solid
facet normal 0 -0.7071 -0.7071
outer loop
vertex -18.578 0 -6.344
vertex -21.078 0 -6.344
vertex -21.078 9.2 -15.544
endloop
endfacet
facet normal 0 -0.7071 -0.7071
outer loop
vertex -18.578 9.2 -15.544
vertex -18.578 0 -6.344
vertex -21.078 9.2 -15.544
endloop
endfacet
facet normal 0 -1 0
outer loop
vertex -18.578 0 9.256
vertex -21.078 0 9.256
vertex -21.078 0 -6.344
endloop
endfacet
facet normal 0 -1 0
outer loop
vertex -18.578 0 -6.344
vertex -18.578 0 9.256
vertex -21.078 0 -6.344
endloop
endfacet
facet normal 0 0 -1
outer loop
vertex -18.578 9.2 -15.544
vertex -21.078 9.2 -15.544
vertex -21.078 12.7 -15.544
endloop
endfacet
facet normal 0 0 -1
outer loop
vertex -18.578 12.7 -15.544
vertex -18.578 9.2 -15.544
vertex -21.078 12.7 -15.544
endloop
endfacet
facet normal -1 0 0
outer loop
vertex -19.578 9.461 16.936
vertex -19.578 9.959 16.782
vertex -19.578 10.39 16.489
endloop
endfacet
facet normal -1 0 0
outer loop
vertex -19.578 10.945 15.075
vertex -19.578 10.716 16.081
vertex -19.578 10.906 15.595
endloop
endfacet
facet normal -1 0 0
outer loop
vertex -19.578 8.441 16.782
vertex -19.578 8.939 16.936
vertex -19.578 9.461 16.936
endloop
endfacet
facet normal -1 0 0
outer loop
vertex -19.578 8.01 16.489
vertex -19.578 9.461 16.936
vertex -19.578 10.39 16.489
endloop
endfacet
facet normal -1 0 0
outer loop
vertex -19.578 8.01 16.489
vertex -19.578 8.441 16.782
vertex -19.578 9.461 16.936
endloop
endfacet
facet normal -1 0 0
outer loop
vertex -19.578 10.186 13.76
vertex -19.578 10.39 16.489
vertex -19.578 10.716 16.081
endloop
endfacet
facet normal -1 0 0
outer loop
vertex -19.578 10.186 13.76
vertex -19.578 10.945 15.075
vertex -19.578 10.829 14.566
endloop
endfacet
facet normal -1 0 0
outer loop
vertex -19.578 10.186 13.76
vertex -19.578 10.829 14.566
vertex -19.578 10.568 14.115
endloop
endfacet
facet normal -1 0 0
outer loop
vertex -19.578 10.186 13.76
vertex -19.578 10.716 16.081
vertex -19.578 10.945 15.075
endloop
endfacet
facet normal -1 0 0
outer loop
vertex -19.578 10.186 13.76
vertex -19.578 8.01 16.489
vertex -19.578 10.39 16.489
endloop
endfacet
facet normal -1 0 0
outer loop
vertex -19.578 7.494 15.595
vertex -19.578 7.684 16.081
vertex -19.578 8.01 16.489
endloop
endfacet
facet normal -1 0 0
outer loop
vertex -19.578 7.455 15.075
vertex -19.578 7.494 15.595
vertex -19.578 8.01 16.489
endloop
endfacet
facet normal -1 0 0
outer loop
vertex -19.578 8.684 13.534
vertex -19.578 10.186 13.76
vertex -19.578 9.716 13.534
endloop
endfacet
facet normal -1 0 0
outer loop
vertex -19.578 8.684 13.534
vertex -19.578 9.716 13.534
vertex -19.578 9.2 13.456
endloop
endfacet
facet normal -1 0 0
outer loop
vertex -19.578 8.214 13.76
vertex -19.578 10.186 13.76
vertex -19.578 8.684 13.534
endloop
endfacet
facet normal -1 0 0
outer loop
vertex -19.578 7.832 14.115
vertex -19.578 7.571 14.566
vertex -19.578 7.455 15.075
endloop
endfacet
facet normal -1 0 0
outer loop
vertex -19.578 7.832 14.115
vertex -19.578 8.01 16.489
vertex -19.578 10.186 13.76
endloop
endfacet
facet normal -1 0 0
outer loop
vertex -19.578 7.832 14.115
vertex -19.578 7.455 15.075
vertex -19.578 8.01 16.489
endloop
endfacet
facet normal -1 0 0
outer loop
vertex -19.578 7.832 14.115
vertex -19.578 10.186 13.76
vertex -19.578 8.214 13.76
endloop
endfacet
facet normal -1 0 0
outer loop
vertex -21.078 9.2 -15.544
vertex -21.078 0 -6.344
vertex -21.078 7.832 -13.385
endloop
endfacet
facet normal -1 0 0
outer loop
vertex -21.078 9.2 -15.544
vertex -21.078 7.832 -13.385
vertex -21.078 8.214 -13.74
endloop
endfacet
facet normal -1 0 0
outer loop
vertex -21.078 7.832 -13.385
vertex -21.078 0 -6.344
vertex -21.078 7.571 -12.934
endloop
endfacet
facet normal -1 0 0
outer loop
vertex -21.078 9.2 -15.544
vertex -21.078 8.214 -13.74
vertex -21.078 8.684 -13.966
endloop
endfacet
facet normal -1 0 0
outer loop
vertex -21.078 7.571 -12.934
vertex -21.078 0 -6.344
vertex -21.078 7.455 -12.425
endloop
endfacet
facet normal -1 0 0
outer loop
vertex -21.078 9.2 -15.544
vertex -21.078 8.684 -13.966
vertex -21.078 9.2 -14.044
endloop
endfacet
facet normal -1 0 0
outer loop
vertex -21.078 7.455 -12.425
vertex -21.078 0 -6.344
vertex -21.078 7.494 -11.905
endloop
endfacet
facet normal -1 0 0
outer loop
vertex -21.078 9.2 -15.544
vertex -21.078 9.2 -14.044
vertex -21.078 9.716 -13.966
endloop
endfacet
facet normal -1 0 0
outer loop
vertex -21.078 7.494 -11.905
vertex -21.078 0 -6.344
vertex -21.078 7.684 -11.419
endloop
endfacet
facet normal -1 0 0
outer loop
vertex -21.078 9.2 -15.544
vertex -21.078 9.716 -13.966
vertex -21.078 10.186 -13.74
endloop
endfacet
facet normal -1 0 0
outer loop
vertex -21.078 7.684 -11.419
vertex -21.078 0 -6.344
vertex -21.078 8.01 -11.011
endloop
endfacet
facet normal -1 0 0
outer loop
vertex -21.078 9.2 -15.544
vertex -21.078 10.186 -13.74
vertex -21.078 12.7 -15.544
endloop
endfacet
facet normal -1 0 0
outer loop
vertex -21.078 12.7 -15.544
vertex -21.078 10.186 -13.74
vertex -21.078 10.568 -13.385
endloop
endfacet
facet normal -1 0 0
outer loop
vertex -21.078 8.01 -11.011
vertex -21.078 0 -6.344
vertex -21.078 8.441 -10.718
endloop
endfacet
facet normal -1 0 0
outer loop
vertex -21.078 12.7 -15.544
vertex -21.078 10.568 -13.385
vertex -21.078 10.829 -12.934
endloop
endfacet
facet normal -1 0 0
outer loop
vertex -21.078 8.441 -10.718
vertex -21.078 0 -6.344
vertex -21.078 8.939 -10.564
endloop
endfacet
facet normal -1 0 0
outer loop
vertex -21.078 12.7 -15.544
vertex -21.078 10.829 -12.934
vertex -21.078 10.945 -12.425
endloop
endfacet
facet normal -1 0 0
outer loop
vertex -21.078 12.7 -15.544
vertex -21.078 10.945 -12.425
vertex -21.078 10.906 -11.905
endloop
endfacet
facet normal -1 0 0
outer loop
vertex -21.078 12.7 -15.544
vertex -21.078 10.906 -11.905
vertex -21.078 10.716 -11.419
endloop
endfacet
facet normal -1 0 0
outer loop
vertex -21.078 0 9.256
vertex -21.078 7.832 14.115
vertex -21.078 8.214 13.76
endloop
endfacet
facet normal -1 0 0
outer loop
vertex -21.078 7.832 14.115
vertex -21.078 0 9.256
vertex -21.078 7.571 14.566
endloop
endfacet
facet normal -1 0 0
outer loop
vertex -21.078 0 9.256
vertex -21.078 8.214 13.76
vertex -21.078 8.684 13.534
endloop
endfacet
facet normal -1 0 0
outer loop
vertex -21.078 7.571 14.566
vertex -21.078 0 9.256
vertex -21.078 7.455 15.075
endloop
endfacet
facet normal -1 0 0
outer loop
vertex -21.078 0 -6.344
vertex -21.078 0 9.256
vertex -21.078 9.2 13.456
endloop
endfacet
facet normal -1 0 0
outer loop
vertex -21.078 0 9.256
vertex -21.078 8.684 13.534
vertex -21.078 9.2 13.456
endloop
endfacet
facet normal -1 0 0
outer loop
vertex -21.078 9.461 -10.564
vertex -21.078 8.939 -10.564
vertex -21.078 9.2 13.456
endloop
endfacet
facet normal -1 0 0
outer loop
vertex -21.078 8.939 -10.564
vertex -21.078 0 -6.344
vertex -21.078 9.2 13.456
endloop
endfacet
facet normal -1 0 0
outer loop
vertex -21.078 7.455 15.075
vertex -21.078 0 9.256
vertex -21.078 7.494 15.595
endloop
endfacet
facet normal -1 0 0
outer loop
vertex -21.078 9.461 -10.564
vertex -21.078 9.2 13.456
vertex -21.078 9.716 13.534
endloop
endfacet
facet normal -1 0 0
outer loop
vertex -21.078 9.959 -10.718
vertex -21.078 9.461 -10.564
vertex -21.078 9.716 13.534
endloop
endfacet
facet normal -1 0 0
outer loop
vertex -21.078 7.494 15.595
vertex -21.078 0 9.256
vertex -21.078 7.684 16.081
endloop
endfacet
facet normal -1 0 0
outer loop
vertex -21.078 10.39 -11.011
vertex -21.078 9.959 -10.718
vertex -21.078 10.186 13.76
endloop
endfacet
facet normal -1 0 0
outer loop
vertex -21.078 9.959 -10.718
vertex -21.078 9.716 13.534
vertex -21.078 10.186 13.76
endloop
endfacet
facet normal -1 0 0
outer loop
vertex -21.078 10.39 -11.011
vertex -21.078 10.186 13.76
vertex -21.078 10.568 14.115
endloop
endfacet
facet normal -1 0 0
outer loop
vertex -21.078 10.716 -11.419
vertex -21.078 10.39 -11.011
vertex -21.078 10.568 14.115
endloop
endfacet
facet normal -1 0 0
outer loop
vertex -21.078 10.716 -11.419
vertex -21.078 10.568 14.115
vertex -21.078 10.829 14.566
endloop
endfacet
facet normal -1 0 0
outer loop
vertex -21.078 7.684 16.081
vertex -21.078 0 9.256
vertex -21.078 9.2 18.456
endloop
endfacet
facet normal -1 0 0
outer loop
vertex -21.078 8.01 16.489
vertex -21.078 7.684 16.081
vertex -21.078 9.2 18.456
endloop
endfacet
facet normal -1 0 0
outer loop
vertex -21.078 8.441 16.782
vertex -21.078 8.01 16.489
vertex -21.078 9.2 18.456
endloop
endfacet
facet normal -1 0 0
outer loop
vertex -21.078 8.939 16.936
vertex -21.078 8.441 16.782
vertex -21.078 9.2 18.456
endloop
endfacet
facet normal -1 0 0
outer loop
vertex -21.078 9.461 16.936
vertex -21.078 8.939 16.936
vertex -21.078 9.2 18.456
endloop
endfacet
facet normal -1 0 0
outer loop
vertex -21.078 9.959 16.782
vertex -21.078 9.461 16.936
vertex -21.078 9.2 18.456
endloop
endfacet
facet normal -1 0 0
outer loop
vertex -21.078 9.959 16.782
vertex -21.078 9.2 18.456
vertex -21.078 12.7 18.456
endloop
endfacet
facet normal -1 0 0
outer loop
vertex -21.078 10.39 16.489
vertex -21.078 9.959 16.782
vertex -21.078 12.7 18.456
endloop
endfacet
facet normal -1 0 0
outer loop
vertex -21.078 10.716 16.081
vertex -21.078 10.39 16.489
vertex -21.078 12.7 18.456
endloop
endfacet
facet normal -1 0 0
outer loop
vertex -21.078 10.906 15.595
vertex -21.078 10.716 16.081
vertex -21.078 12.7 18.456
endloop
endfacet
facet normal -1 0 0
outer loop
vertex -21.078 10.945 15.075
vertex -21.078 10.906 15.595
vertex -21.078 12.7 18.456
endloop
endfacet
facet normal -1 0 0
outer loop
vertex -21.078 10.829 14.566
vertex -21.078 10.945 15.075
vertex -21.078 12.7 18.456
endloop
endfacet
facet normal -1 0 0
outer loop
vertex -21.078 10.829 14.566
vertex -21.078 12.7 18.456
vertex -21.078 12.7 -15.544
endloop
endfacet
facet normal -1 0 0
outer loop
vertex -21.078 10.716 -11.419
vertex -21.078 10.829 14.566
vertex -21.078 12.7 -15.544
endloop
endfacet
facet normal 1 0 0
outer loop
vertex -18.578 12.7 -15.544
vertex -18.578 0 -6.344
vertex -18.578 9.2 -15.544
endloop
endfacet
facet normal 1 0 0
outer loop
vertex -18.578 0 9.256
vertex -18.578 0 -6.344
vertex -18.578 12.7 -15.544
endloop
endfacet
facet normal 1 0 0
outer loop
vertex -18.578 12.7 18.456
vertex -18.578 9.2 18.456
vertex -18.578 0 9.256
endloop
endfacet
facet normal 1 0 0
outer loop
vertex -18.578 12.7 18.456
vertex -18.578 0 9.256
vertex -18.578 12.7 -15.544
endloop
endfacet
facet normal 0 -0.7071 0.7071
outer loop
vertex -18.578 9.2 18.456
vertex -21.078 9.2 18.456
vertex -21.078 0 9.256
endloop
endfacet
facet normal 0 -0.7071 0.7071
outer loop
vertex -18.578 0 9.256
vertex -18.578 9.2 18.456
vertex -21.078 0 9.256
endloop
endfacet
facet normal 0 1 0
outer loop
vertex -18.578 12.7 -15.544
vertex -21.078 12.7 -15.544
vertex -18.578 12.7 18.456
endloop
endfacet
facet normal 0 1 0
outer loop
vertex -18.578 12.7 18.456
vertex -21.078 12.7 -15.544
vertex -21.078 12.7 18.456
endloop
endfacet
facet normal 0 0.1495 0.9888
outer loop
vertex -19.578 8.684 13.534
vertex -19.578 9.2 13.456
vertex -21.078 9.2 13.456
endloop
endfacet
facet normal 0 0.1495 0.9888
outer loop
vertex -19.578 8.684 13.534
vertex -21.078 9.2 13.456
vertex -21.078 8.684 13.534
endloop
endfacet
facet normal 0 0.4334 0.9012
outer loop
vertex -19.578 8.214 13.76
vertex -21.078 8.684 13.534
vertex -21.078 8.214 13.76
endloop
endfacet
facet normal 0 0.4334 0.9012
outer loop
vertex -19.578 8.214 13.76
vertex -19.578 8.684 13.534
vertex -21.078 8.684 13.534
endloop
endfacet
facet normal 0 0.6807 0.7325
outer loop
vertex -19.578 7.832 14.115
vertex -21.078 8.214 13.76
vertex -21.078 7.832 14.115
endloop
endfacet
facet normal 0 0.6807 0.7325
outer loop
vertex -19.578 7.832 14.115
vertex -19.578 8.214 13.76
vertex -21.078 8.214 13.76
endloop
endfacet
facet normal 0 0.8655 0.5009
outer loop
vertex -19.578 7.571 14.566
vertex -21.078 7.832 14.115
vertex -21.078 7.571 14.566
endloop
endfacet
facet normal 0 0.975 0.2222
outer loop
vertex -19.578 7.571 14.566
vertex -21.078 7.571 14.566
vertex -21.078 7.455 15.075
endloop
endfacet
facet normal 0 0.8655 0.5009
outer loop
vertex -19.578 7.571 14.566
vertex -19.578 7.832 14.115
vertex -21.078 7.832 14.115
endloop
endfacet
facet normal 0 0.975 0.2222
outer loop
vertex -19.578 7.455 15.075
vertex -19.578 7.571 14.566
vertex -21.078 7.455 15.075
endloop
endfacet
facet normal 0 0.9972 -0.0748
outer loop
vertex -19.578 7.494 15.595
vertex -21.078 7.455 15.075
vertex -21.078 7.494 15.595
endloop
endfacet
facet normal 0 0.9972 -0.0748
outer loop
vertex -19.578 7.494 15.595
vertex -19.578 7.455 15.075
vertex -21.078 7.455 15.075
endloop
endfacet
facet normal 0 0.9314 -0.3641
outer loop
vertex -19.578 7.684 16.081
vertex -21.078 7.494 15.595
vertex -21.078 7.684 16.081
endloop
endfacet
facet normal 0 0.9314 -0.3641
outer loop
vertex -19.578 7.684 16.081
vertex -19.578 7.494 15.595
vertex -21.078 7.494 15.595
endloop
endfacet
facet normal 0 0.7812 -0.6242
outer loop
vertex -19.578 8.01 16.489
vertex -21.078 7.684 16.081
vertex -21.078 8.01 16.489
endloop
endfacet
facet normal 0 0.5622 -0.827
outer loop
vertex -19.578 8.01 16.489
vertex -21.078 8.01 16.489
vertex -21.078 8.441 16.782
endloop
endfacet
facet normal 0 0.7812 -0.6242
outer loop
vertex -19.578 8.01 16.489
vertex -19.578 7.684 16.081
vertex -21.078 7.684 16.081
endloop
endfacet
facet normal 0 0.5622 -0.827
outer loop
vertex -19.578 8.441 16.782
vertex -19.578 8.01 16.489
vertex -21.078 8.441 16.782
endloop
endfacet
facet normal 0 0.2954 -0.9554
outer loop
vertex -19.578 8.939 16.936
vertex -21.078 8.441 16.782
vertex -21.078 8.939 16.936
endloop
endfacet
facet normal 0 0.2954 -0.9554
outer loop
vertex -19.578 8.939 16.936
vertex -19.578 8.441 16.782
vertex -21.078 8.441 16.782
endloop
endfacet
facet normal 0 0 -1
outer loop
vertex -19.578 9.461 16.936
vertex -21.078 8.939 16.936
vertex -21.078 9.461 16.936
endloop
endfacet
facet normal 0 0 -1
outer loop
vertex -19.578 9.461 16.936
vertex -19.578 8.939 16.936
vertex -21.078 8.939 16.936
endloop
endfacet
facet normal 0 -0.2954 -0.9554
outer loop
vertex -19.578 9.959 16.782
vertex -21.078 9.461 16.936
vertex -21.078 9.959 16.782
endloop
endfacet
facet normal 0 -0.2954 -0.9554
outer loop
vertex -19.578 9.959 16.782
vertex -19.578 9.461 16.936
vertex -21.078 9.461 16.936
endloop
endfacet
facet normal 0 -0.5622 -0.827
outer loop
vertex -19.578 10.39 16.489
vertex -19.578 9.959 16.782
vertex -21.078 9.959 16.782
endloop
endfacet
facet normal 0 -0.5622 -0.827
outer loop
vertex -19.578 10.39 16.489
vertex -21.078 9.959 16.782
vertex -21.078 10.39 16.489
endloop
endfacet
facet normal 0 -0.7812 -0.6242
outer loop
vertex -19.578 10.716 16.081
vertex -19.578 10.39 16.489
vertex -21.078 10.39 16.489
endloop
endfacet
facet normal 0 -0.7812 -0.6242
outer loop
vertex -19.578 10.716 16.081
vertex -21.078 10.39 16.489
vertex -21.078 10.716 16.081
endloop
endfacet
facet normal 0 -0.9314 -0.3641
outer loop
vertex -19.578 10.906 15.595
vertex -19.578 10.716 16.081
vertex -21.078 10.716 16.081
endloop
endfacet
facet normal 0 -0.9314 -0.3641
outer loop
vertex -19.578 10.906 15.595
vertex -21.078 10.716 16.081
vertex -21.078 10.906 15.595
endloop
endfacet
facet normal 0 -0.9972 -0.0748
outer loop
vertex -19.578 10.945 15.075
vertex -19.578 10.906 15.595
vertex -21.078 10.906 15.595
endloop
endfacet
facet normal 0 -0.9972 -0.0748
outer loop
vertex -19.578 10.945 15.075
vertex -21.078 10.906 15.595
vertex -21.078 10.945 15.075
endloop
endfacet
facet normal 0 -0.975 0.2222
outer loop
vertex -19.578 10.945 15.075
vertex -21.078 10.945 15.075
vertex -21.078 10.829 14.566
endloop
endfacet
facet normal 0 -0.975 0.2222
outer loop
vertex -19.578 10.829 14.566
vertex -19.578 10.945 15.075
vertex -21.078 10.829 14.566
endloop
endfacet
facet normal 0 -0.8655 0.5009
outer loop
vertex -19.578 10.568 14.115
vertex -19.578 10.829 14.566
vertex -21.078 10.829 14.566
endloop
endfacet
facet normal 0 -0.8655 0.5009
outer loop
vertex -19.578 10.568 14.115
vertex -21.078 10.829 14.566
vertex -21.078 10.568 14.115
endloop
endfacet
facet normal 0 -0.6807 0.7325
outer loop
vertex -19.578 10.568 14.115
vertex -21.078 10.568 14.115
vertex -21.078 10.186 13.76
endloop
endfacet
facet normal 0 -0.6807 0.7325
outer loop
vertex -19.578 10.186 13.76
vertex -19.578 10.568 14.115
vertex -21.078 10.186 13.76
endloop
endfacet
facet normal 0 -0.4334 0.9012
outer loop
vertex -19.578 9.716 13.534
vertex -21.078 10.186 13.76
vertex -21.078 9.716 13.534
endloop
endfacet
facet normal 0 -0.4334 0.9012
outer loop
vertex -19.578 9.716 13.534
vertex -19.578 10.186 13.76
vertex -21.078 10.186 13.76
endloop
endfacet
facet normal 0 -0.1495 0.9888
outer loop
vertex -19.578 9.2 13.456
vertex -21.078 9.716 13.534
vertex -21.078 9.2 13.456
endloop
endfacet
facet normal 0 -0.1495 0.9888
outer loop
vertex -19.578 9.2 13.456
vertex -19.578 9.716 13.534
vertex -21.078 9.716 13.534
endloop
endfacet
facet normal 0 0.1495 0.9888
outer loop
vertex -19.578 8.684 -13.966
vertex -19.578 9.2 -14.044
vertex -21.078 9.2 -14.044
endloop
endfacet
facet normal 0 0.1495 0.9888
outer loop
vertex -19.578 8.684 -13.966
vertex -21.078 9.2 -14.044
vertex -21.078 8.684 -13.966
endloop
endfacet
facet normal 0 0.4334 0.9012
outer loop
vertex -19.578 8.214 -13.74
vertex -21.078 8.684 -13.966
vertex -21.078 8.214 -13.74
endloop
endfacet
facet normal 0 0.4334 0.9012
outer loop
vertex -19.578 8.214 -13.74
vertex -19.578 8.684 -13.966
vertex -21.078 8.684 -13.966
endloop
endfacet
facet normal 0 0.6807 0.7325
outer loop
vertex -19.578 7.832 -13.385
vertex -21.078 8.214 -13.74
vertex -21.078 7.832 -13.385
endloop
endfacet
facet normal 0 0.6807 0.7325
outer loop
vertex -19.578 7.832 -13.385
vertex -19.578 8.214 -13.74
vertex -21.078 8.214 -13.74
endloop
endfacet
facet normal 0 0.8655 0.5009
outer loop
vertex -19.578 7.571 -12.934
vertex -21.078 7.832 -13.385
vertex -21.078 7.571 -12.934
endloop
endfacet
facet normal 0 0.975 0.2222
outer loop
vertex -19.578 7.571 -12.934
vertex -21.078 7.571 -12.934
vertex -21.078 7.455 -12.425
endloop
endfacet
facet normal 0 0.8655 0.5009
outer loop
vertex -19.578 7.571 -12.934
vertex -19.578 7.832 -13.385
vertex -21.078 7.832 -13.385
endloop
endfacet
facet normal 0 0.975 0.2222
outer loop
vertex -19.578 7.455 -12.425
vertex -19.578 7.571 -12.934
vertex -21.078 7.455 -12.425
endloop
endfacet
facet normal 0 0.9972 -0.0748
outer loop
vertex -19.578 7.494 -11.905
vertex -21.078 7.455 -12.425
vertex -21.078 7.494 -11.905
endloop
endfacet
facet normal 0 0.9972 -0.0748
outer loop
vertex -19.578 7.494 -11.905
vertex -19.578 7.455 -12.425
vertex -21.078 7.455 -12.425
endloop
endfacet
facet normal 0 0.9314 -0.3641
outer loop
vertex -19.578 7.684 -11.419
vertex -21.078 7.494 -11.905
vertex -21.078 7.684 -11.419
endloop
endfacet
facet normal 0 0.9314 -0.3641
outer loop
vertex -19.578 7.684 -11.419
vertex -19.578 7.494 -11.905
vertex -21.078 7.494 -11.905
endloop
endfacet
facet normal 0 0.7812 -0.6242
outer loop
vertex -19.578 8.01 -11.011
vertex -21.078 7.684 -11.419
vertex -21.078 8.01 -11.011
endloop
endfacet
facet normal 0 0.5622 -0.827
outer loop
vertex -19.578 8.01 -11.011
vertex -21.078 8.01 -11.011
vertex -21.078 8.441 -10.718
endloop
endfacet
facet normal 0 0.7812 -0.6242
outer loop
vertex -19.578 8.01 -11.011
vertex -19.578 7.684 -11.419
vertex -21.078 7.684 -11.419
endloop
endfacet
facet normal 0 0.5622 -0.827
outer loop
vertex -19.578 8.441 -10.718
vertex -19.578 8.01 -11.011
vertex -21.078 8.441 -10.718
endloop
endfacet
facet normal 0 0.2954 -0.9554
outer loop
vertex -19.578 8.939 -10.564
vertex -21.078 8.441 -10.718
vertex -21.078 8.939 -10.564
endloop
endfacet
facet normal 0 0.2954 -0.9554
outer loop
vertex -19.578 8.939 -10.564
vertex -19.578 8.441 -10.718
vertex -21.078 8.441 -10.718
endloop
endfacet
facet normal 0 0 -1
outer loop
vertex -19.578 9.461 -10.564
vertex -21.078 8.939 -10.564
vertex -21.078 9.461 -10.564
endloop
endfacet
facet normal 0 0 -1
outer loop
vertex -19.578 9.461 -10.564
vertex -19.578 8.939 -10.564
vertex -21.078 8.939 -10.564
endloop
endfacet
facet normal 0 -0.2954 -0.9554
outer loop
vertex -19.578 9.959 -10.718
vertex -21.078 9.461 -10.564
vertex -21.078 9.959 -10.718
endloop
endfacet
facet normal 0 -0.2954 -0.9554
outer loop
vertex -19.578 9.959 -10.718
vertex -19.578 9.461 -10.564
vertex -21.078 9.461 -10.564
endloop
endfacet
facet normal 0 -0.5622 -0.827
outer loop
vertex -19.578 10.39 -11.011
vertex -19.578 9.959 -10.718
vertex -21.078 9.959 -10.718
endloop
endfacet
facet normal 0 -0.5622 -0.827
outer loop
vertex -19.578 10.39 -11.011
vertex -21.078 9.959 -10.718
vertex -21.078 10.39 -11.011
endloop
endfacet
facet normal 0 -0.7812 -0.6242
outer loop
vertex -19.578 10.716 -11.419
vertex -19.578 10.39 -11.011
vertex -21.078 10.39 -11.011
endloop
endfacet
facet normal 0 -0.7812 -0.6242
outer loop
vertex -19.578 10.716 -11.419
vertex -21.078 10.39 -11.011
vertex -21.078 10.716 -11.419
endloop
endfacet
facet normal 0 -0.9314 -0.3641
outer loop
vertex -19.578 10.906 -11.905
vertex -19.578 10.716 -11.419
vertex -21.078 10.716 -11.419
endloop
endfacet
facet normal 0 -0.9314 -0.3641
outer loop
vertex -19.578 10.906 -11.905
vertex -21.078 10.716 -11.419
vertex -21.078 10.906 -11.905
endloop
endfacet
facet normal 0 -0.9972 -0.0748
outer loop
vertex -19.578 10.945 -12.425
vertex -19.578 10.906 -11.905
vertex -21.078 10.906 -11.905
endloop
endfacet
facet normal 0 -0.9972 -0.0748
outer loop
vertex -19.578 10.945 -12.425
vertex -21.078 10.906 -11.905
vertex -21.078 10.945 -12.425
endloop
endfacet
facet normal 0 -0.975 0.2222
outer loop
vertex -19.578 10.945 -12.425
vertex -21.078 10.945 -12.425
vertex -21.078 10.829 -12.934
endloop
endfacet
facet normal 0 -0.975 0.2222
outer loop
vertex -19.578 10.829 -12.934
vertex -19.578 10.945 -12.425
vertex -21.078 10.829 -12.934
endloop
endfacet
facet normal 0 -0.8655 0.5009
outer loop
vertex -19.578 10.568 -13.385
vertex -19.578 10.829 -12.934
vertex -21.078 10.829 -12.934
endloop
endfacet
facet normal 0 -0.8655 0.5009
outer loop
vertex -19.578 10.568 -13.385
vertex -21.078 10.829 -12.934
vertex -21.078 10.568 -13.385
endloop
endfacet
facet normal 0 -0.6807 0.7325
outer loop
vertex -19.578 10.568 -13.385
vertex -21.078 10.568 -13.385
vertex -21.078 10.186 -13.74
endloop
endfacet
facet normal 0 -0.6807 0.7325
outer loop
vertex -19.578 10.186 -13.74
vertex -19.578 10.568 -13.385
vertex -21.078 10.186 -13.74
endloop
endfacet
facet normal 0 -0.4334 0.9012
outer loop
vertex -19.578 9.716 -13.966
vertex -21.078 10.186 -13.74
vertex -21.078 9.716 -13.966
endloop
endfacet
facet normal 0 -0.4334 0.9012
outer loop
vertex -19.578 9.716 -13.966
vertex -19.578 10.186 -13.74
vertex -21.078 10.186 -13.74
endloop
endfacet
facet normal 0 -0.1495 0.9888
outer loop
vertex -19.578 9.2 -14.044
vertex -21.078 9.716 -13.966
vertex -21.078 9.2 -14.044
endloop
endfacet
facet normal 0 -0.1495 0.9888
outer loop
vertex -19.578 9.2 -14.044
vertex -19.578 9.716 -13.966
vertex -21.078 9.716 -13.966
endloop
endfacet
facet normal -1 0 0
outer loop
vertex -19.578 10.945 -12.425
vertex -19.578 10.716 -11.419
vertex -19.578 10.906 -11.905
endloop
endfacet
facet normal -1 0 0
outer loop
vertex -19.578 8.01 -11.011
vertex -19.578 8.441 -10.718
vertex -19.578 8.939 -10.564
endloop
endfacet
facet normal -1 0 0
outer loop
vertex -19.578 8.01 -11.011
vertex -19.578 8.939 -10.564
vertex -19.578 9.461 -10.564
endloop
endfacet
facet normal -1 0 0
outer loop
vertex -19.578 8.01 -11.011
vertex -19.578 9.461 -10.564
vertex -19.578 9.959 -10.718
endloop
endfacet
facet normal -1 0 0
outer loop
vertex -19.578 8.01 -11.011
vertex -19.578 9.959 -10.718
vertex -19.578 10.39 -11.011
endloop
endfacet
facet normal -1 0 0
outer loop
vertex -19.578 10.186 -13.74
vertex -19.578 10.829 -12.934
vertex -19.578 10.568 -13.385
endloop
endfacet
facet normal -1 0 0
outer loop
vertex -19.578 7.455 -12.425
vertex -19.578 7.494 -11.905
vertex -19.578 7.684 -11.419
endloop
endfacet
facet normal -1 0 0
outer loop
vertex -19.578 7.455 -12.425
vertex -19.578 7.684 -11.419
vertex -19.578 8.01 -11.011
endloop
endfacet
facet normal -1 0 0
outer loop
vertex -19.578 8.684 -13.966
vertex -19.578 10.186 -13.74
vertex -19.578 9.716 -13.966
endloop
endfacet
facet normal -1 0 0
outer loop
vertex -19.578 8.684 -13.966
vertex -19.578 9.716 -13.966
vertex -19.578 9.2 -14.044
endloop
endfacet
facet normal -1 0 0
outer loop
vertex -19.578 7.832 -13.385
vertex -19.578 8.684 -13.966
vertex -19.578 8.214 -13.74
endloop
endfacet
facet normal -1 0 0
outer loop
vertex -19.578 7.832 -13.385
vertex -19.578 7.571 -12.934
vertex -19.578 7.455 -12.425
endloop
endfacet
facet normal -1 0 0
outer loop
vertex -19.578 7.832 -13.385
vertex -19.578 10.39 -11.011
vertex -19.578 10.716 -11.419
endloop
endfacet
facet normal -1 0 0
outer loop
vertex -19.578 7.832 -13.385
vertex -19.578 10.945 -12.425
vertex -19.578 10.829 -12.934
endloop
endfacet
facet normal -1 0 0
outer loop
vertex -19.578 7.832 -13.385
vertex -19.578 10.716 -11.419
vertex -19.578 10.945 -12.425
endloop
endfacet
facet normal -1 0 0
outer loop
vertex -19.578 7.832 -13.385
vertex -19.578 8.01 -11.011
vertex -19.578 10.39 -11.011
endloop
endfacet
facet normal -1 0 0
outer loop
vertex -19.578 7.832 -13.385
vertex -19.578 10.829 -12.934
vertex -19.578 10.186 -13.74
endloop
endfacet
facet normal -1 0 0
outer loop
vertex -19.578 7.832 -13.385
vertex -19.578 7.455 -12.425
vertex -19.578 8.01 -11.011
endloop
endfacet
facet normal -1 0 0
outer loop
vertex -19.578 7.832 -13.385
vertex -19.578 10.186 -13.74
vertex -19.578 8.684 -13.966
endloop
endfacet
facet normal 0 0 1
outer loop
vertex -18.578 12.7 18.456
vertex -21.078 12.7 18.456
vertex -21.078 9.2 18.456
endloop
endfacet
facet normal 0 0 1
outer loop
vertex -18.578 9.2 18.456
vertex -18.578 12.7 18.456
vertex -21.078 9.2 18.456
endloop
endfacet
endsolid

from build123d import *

# Parameters (mm, degrees)
STOCK_TEST_FINGER_MICHELLE_V2_1_START = -21.07817965
STOCK_TEST_FINGER_MICHELLE_V2_1_DEPTH = 2.5
CUT_EXTRUDE1_START                    = -1.5
SKETCH1_R                             = 1.75
CUT_EXTRUDE1_DEPTH                    = 1.5


# Read off the part's stored shape, not the designer's step: Stock-test_finger_michelle_V2-1
with BuildPart() as part:
    # Stock-test_finger_michelle_V2-1 outline → Stock-test_finger_michelle_V2-1 (new body)
    with BuildSketch(Plane.YZ.offset(STOCK_TEST_FINGER_MICHELLE_V2_1_START)):
        Polygon((0, -6.34419618), (9.2, -15.54419618), (12.7, -15.54419618), (12.7, 18.45580382), (9.2, 18.45580382), (0, 9.25580382), align=None)
    extrude(amount=STOCK_TEST_FINGER_MICHELLE_V2_1_DEPTH)

    # Sketch1 → Cut-Extrude1 (cut)
    with BuildSketch(Plane.ZY.offset(21.07817965).offset(CUT_EXTRUDE1_START)):
        with Locations(Location((-12.29419618, 9.2, 0), (0, 0, 180))):
            Circle(SKETCH1_R)
        with Locations(Location((15.20580382, 9.2, 0), (0, 0, 180))):
            Circle(SKETCH1_R)
    extrude(amount=CUT_EXTRUDE1_DEPTH, mode=Mode.SUBTRACT)


solid = part.part
